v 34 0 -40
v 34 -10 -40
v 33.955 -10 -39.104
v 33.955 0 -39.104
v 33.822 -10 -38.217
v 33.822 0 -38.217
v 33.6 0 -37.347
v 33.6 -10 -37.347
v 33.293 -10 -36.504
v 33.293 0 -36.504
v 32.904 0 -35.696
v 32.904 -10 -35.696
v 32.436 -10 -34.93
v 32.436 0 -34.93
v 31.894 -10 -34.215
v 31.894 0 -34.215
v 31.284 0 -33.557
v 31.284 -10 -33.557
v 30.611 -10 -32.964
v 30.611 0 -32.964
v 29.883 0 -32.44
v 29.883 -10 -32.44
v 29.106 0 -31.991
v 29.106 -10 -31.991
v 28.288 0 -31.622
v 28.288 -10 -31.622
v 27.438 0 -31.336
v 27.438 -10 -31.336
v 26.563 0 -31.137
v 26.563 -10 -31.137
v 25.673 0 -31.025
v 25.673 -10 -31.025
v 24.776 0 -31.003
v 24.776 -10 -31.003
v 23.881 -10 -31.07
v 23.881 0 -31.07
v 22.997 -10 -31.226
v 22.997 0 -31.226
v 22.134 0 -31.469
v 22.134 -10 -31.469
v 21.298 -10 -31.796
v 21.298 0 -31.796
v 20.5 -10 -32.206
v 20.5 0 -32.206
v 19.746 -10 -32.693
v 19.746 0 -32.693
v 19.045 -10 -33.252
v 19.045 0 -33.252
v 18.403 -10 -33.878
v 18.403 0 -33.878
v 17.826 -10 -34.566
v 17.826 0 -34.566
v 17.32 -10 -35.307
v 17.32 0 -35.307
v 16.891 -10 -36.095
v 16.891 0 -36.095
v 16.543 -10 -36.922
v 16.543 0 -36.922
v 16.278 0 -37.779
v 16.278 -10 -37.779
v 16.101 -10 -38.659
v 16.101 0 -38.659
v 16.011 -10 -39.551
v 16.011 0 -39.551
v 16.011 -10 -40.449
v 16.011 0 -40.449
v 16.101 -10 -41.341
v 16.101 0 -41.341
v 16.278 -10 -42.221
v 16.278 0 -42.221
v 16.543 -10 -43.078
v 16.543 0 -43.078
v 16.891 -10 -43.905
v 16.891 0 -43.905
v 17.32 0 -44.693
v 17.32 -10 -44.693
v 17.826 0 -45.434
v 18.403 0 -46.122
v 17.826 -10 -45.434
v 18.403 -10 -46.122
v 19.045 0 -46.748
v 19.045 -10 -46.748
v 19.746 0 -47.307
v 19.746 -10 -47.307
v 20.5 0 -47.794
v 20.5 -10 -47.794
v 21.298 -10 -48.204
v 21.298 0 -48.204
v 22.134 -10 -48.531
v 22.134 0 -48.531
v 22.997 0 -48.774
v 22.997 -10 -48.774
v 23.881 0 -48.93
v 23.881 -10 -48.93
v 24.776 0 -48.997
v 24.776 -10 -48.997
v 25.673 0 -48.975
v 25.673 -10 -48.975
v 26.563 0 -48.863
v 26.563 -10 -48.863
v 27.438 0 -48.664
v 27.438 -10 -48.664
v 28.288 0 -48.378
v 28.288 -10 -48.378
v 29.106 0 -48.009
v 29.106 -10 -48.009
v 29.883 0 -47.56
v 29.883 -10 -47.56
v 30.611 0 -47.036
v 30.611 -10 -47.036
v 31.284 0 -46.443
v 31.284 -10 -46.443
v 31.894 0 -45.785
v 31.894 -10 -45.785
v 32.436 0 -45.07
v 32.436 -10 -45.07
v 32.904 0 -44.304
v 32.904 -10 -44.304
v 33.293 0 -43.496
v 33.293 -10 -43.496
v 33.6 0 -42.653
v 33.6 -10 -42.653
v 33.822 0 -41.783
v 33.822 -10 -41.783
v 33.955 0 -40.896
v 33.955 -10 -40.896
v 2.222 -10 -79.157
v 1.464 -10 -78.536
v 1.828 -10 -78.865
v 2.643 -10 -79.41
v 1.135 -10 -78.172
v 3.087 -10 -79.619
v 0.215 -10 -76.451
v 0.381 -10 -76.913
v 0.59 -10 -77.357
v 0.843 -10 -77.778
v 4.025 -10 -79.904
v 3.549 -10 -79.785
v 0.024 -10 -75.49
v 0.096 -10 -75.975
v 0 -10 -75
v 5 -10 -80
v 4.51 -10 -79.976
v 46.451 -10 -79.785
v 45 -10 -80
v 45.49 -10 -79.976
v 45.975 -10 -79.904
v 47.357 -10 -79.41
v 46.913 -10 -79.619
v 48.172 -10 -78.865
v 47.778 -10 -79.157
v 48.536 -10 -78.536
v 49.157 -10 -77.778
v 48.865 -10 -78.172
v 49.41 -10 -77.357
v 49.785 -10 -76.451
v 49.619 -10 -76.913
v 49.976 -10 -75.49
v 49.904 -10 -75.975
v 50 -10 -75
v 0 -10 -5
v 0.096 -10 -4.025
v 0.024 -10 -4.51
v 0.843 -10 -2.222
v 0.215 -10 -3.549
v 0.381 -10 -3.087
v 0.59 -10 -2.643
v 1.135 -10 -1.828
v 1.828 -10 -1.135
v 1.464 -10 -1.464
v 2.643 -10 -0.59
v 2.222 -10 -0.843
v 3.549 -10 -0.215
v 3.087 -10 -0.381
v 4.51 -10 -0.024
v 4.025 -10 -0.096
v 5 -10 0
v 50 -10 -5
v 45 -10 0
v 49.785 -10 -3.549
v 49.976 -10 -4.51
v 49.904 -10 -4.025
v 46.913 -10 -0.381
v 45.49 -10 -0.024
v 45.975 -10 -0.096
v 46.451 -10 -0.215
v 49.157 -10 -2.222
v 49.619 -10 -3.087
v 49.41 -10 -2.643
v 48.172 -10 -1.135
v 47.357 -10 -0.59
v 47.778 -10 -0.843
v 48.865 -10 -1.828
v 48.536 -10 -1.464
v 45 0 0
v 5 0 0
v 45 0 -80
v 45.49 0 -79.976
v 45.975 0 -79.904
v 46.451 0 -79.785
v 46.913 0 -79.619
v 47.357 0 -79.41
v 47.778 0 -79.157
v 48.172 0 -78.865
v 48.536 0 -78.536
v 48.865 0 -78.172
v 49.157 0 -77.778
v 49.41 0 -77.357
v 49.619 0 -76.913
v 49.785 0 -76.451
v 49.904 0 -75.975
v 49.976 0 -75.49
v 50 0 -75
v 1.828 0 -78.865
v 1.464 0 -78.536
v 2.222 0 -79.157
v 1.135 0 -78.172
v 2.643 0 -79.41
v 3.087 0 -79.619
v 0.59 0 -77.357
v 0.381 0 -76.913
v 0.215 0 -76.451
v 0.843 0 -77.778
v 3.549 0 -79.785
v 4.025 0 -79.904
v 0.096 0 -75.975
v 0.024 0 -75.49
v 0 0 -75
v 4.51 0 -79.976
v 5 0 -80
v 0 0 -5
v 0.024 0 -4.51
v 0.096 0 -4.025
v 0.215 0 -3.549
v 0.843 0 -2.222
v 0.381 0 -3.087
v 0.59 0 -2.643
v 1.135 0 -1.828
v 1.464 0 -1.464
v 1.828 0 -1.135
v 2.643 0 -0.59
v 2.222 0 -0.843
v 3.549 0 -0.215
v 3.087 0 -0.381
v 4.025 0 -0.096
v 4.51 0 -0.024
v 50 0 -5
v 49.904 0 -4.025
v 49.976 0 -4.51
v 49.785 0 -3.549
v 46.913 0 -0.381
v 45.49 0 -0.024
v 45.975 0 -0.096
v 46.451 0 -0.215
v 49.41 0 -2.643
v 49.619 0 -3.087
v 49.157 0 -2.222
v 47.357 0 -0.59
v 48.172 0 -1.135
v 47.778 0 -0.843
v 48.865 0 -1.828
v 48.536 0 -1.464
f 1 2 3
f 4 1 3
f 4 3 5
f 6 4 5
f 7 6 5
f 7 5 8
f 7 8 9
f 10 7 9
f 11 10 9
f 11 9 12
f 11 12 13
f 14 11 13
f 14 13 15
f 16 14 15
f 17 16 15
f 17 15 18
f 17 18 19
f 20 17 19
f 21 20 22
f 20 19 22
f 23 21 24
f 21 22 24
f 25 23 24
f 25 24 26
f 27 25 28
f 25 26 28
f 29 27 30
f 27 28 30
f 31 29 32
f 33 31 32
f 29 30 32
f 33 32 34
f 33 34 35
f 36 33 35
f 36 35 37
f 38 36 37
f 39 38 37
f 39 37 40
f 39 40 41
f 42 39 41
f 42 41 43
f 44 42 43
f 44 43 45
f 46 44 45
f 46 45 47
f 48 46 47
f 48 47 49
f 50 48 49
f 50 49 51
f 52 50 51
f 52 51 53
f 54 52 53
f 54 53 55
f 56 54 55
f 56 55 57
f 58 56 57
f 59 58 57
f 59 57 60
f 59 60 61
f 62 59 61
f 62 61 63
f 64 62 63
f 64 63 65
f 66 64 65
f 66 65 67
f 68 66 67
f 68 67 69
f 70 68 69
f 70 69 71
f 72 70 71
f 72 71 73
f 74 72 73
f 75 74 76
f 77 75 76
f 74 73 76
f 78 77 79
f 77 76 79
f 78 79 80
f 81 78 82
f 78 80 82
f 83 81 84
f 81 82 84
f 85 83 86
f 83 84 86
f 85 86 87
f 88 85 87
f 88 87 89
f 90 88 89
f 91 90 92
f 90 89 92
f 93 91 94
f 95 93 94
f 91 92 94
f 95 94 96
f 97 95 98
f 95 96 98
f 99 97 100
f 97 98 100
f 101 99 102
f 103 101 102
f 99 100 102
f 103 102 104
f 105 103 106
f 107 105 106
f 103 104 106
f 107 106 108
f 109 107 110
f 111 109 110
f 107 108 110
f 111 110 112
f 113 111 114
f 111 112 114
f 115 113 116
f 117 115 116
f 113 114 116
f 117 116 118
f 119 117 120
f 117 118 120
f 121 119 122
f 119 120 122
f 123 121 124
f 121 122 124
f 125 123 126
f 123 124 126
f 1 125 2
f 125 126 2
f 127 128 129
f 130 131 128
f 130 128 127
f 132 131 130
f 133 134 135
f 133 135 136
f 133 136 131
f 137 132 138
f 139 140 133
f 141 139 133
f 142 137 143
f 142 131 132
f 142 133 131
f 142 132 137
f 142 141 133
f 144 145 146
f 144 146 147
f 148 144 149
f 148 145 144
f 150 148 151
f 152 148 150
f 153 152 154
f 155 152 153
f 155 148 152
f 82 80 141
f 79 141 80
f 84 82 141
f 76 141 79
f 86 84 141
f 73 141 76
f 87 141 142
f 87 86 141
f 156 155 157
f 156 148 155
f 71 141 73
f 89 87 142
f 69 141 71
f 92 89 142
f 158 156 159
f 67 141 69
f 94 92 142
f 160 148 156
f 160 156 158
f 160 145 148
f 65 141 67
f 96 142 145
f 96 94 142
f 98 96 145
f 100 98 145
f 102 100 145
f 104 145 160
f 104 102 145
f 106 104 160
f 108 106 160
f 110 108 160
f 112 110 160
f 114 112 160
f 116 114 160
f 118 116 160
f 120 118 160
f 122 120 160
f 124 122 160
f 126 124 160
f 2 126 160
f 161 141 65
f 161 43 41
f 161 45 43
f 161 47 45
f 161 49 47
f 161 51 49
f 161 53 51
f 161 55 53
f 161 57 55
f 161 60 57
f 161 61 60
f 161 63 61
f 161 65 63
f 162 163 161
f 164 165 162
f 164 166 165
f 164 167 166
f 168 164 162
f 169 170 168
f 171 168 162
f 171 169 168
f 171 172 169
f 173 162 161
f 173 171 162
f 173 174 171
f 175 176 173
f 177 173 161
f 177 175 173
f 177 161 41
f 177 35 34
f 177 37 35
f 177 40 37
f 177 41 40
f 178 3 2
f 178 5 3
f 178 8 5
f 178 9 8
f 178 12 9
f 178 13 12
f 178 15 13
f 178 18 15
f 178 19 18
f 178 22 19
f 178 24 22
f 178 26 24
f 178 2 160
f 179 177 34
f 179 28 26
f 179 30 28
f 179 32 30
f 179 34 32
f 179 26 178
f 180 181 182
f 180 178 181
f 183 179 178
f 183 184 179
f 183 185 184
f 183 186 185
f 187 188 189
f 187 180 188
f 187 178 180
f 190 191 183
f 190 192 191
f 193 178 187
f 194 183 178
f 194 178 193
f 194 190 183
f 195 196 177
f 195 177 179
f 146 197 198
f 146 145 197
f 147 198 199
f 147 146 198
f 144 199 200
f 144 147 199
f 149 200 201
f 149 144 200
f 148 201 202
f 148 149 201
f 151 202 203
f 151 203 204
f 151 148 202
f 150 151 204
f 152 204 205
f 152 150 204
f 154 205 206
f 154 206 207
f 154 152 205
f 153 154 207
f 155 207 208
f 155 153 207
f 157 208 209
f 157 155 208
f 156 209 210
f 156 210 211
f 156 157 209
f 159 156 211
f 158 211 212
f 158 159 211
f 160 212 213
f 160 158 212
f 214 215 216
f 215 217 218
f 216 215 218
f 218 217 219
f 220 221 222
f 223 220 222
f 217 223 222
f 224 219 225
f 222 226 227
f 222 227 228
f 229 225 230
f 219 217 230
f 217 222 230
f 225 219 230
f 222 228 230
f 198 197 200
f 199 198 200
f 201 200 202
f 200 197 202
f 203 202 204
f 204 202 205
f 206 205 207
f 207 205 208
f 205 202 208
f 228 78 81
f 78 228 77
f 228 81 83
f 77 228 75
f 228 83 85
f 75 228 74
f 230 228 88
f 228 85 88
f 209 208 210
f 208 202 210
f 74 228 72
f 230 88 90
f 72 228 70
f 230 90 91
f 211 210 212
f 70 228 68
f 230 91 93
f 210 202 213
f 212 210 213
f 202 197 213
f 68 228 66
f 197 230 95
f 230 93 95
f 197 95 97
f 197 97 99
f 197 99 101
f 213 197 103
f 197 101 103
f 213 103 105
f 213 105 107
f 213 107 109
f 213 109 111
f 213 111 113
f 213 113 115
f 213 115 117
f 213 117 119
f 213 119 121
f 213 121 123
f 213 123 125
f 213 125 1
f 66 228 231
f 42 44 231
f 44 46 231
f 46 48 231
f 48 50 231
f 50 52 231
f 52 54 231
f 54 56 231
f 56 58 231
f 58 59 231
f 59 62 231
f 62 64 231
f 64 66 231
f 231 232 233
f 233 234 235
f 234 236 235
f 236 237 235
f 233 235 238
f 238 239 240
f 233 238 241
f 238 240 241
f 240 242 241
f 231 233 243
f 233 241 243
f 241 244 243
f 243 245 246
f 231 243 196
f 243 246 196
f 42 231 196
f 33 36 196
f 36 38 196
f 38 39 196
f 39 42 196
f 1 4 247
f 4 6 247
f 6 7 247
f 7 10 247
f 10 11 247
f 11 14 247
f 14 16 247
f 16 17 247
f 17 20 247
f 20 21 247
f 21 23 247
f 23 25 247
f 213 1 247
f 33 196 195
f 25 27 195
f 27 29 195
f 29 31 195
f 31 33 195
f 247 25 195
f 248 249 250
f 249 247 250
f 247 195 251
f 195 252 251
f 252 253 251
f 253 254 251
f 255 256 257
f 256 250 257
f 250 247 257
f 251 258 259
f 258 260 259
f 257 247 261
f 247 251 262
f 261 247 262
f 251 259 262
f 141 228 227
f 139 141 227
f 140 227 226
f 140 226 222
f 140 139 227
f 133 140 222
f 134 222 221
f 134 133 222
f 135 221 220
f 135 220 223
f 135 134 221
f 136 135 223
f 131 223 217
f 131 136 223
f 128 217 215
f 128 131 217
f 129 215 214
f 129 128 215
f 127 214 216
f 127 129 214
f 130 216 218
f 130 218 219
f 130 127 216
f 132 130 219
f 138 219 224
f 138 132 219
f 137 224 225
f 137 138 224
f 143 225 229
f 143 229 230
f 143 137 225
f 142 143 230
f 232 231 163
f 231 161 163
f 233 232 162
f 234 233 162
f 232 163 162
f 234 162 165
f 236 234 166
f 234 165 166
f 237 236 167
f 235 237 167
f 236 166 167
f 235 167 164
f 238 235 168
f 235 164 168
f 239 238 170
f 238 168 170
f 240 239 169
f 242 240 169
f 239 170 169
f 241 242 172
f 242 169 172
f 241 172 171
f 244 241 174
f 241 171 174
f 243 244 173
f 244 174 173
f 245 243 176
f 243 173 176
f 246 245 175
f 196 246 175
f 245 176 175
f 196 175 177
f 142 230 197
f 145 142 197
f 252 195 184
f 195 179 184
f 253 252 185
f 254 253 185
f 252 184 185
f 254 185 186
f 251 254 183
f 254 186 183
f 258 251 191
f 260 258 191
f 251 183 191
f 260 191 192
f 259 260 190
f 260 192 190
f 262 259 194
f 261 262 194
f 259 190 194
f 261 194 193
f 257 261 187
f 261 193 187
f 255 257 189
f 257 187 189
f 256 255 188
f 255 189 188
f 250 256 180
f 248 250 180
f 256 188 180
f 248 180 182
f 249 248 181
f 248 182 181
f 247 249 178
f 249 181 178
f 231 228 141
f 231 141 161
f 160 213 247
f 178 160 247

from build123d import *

# Parameters (mm, degrees)
F0_W     = 50
F0_H     = 80
F1_DEPTH = 10
F2_R     = 9
F3_DEPTH = 10.001
F4_R     = 5


with BuildPart() as f1:
    # F0 (on Front) → F1 (new body)
    with BuildSketch(Plane.XZ):
        with Locations((25, -40)):
            Rectangle(F0_W, F0_H)
    extrude(amount=F1_DEPTH)

    # F2 (on face) → F3 (cut, through all)
    with BuildSketch(Plane.XZ.offset(10)):
        with Locations((25, -40)):
            Circle(F2_R)
    extrude(amount=-F3_DEPTH, mode=Mode.SUBTRACT)

    # F4
    f4_edges = [f1.edges().sort_by_distance(p)[0] for p in [
        (50, -5, 0),
        (0, -5, 0),
        (50, -5, -80),
        (0, -5, -80),
    ]]
    fillet(f4_edges, radius=F4_R)


solid = f1.part
